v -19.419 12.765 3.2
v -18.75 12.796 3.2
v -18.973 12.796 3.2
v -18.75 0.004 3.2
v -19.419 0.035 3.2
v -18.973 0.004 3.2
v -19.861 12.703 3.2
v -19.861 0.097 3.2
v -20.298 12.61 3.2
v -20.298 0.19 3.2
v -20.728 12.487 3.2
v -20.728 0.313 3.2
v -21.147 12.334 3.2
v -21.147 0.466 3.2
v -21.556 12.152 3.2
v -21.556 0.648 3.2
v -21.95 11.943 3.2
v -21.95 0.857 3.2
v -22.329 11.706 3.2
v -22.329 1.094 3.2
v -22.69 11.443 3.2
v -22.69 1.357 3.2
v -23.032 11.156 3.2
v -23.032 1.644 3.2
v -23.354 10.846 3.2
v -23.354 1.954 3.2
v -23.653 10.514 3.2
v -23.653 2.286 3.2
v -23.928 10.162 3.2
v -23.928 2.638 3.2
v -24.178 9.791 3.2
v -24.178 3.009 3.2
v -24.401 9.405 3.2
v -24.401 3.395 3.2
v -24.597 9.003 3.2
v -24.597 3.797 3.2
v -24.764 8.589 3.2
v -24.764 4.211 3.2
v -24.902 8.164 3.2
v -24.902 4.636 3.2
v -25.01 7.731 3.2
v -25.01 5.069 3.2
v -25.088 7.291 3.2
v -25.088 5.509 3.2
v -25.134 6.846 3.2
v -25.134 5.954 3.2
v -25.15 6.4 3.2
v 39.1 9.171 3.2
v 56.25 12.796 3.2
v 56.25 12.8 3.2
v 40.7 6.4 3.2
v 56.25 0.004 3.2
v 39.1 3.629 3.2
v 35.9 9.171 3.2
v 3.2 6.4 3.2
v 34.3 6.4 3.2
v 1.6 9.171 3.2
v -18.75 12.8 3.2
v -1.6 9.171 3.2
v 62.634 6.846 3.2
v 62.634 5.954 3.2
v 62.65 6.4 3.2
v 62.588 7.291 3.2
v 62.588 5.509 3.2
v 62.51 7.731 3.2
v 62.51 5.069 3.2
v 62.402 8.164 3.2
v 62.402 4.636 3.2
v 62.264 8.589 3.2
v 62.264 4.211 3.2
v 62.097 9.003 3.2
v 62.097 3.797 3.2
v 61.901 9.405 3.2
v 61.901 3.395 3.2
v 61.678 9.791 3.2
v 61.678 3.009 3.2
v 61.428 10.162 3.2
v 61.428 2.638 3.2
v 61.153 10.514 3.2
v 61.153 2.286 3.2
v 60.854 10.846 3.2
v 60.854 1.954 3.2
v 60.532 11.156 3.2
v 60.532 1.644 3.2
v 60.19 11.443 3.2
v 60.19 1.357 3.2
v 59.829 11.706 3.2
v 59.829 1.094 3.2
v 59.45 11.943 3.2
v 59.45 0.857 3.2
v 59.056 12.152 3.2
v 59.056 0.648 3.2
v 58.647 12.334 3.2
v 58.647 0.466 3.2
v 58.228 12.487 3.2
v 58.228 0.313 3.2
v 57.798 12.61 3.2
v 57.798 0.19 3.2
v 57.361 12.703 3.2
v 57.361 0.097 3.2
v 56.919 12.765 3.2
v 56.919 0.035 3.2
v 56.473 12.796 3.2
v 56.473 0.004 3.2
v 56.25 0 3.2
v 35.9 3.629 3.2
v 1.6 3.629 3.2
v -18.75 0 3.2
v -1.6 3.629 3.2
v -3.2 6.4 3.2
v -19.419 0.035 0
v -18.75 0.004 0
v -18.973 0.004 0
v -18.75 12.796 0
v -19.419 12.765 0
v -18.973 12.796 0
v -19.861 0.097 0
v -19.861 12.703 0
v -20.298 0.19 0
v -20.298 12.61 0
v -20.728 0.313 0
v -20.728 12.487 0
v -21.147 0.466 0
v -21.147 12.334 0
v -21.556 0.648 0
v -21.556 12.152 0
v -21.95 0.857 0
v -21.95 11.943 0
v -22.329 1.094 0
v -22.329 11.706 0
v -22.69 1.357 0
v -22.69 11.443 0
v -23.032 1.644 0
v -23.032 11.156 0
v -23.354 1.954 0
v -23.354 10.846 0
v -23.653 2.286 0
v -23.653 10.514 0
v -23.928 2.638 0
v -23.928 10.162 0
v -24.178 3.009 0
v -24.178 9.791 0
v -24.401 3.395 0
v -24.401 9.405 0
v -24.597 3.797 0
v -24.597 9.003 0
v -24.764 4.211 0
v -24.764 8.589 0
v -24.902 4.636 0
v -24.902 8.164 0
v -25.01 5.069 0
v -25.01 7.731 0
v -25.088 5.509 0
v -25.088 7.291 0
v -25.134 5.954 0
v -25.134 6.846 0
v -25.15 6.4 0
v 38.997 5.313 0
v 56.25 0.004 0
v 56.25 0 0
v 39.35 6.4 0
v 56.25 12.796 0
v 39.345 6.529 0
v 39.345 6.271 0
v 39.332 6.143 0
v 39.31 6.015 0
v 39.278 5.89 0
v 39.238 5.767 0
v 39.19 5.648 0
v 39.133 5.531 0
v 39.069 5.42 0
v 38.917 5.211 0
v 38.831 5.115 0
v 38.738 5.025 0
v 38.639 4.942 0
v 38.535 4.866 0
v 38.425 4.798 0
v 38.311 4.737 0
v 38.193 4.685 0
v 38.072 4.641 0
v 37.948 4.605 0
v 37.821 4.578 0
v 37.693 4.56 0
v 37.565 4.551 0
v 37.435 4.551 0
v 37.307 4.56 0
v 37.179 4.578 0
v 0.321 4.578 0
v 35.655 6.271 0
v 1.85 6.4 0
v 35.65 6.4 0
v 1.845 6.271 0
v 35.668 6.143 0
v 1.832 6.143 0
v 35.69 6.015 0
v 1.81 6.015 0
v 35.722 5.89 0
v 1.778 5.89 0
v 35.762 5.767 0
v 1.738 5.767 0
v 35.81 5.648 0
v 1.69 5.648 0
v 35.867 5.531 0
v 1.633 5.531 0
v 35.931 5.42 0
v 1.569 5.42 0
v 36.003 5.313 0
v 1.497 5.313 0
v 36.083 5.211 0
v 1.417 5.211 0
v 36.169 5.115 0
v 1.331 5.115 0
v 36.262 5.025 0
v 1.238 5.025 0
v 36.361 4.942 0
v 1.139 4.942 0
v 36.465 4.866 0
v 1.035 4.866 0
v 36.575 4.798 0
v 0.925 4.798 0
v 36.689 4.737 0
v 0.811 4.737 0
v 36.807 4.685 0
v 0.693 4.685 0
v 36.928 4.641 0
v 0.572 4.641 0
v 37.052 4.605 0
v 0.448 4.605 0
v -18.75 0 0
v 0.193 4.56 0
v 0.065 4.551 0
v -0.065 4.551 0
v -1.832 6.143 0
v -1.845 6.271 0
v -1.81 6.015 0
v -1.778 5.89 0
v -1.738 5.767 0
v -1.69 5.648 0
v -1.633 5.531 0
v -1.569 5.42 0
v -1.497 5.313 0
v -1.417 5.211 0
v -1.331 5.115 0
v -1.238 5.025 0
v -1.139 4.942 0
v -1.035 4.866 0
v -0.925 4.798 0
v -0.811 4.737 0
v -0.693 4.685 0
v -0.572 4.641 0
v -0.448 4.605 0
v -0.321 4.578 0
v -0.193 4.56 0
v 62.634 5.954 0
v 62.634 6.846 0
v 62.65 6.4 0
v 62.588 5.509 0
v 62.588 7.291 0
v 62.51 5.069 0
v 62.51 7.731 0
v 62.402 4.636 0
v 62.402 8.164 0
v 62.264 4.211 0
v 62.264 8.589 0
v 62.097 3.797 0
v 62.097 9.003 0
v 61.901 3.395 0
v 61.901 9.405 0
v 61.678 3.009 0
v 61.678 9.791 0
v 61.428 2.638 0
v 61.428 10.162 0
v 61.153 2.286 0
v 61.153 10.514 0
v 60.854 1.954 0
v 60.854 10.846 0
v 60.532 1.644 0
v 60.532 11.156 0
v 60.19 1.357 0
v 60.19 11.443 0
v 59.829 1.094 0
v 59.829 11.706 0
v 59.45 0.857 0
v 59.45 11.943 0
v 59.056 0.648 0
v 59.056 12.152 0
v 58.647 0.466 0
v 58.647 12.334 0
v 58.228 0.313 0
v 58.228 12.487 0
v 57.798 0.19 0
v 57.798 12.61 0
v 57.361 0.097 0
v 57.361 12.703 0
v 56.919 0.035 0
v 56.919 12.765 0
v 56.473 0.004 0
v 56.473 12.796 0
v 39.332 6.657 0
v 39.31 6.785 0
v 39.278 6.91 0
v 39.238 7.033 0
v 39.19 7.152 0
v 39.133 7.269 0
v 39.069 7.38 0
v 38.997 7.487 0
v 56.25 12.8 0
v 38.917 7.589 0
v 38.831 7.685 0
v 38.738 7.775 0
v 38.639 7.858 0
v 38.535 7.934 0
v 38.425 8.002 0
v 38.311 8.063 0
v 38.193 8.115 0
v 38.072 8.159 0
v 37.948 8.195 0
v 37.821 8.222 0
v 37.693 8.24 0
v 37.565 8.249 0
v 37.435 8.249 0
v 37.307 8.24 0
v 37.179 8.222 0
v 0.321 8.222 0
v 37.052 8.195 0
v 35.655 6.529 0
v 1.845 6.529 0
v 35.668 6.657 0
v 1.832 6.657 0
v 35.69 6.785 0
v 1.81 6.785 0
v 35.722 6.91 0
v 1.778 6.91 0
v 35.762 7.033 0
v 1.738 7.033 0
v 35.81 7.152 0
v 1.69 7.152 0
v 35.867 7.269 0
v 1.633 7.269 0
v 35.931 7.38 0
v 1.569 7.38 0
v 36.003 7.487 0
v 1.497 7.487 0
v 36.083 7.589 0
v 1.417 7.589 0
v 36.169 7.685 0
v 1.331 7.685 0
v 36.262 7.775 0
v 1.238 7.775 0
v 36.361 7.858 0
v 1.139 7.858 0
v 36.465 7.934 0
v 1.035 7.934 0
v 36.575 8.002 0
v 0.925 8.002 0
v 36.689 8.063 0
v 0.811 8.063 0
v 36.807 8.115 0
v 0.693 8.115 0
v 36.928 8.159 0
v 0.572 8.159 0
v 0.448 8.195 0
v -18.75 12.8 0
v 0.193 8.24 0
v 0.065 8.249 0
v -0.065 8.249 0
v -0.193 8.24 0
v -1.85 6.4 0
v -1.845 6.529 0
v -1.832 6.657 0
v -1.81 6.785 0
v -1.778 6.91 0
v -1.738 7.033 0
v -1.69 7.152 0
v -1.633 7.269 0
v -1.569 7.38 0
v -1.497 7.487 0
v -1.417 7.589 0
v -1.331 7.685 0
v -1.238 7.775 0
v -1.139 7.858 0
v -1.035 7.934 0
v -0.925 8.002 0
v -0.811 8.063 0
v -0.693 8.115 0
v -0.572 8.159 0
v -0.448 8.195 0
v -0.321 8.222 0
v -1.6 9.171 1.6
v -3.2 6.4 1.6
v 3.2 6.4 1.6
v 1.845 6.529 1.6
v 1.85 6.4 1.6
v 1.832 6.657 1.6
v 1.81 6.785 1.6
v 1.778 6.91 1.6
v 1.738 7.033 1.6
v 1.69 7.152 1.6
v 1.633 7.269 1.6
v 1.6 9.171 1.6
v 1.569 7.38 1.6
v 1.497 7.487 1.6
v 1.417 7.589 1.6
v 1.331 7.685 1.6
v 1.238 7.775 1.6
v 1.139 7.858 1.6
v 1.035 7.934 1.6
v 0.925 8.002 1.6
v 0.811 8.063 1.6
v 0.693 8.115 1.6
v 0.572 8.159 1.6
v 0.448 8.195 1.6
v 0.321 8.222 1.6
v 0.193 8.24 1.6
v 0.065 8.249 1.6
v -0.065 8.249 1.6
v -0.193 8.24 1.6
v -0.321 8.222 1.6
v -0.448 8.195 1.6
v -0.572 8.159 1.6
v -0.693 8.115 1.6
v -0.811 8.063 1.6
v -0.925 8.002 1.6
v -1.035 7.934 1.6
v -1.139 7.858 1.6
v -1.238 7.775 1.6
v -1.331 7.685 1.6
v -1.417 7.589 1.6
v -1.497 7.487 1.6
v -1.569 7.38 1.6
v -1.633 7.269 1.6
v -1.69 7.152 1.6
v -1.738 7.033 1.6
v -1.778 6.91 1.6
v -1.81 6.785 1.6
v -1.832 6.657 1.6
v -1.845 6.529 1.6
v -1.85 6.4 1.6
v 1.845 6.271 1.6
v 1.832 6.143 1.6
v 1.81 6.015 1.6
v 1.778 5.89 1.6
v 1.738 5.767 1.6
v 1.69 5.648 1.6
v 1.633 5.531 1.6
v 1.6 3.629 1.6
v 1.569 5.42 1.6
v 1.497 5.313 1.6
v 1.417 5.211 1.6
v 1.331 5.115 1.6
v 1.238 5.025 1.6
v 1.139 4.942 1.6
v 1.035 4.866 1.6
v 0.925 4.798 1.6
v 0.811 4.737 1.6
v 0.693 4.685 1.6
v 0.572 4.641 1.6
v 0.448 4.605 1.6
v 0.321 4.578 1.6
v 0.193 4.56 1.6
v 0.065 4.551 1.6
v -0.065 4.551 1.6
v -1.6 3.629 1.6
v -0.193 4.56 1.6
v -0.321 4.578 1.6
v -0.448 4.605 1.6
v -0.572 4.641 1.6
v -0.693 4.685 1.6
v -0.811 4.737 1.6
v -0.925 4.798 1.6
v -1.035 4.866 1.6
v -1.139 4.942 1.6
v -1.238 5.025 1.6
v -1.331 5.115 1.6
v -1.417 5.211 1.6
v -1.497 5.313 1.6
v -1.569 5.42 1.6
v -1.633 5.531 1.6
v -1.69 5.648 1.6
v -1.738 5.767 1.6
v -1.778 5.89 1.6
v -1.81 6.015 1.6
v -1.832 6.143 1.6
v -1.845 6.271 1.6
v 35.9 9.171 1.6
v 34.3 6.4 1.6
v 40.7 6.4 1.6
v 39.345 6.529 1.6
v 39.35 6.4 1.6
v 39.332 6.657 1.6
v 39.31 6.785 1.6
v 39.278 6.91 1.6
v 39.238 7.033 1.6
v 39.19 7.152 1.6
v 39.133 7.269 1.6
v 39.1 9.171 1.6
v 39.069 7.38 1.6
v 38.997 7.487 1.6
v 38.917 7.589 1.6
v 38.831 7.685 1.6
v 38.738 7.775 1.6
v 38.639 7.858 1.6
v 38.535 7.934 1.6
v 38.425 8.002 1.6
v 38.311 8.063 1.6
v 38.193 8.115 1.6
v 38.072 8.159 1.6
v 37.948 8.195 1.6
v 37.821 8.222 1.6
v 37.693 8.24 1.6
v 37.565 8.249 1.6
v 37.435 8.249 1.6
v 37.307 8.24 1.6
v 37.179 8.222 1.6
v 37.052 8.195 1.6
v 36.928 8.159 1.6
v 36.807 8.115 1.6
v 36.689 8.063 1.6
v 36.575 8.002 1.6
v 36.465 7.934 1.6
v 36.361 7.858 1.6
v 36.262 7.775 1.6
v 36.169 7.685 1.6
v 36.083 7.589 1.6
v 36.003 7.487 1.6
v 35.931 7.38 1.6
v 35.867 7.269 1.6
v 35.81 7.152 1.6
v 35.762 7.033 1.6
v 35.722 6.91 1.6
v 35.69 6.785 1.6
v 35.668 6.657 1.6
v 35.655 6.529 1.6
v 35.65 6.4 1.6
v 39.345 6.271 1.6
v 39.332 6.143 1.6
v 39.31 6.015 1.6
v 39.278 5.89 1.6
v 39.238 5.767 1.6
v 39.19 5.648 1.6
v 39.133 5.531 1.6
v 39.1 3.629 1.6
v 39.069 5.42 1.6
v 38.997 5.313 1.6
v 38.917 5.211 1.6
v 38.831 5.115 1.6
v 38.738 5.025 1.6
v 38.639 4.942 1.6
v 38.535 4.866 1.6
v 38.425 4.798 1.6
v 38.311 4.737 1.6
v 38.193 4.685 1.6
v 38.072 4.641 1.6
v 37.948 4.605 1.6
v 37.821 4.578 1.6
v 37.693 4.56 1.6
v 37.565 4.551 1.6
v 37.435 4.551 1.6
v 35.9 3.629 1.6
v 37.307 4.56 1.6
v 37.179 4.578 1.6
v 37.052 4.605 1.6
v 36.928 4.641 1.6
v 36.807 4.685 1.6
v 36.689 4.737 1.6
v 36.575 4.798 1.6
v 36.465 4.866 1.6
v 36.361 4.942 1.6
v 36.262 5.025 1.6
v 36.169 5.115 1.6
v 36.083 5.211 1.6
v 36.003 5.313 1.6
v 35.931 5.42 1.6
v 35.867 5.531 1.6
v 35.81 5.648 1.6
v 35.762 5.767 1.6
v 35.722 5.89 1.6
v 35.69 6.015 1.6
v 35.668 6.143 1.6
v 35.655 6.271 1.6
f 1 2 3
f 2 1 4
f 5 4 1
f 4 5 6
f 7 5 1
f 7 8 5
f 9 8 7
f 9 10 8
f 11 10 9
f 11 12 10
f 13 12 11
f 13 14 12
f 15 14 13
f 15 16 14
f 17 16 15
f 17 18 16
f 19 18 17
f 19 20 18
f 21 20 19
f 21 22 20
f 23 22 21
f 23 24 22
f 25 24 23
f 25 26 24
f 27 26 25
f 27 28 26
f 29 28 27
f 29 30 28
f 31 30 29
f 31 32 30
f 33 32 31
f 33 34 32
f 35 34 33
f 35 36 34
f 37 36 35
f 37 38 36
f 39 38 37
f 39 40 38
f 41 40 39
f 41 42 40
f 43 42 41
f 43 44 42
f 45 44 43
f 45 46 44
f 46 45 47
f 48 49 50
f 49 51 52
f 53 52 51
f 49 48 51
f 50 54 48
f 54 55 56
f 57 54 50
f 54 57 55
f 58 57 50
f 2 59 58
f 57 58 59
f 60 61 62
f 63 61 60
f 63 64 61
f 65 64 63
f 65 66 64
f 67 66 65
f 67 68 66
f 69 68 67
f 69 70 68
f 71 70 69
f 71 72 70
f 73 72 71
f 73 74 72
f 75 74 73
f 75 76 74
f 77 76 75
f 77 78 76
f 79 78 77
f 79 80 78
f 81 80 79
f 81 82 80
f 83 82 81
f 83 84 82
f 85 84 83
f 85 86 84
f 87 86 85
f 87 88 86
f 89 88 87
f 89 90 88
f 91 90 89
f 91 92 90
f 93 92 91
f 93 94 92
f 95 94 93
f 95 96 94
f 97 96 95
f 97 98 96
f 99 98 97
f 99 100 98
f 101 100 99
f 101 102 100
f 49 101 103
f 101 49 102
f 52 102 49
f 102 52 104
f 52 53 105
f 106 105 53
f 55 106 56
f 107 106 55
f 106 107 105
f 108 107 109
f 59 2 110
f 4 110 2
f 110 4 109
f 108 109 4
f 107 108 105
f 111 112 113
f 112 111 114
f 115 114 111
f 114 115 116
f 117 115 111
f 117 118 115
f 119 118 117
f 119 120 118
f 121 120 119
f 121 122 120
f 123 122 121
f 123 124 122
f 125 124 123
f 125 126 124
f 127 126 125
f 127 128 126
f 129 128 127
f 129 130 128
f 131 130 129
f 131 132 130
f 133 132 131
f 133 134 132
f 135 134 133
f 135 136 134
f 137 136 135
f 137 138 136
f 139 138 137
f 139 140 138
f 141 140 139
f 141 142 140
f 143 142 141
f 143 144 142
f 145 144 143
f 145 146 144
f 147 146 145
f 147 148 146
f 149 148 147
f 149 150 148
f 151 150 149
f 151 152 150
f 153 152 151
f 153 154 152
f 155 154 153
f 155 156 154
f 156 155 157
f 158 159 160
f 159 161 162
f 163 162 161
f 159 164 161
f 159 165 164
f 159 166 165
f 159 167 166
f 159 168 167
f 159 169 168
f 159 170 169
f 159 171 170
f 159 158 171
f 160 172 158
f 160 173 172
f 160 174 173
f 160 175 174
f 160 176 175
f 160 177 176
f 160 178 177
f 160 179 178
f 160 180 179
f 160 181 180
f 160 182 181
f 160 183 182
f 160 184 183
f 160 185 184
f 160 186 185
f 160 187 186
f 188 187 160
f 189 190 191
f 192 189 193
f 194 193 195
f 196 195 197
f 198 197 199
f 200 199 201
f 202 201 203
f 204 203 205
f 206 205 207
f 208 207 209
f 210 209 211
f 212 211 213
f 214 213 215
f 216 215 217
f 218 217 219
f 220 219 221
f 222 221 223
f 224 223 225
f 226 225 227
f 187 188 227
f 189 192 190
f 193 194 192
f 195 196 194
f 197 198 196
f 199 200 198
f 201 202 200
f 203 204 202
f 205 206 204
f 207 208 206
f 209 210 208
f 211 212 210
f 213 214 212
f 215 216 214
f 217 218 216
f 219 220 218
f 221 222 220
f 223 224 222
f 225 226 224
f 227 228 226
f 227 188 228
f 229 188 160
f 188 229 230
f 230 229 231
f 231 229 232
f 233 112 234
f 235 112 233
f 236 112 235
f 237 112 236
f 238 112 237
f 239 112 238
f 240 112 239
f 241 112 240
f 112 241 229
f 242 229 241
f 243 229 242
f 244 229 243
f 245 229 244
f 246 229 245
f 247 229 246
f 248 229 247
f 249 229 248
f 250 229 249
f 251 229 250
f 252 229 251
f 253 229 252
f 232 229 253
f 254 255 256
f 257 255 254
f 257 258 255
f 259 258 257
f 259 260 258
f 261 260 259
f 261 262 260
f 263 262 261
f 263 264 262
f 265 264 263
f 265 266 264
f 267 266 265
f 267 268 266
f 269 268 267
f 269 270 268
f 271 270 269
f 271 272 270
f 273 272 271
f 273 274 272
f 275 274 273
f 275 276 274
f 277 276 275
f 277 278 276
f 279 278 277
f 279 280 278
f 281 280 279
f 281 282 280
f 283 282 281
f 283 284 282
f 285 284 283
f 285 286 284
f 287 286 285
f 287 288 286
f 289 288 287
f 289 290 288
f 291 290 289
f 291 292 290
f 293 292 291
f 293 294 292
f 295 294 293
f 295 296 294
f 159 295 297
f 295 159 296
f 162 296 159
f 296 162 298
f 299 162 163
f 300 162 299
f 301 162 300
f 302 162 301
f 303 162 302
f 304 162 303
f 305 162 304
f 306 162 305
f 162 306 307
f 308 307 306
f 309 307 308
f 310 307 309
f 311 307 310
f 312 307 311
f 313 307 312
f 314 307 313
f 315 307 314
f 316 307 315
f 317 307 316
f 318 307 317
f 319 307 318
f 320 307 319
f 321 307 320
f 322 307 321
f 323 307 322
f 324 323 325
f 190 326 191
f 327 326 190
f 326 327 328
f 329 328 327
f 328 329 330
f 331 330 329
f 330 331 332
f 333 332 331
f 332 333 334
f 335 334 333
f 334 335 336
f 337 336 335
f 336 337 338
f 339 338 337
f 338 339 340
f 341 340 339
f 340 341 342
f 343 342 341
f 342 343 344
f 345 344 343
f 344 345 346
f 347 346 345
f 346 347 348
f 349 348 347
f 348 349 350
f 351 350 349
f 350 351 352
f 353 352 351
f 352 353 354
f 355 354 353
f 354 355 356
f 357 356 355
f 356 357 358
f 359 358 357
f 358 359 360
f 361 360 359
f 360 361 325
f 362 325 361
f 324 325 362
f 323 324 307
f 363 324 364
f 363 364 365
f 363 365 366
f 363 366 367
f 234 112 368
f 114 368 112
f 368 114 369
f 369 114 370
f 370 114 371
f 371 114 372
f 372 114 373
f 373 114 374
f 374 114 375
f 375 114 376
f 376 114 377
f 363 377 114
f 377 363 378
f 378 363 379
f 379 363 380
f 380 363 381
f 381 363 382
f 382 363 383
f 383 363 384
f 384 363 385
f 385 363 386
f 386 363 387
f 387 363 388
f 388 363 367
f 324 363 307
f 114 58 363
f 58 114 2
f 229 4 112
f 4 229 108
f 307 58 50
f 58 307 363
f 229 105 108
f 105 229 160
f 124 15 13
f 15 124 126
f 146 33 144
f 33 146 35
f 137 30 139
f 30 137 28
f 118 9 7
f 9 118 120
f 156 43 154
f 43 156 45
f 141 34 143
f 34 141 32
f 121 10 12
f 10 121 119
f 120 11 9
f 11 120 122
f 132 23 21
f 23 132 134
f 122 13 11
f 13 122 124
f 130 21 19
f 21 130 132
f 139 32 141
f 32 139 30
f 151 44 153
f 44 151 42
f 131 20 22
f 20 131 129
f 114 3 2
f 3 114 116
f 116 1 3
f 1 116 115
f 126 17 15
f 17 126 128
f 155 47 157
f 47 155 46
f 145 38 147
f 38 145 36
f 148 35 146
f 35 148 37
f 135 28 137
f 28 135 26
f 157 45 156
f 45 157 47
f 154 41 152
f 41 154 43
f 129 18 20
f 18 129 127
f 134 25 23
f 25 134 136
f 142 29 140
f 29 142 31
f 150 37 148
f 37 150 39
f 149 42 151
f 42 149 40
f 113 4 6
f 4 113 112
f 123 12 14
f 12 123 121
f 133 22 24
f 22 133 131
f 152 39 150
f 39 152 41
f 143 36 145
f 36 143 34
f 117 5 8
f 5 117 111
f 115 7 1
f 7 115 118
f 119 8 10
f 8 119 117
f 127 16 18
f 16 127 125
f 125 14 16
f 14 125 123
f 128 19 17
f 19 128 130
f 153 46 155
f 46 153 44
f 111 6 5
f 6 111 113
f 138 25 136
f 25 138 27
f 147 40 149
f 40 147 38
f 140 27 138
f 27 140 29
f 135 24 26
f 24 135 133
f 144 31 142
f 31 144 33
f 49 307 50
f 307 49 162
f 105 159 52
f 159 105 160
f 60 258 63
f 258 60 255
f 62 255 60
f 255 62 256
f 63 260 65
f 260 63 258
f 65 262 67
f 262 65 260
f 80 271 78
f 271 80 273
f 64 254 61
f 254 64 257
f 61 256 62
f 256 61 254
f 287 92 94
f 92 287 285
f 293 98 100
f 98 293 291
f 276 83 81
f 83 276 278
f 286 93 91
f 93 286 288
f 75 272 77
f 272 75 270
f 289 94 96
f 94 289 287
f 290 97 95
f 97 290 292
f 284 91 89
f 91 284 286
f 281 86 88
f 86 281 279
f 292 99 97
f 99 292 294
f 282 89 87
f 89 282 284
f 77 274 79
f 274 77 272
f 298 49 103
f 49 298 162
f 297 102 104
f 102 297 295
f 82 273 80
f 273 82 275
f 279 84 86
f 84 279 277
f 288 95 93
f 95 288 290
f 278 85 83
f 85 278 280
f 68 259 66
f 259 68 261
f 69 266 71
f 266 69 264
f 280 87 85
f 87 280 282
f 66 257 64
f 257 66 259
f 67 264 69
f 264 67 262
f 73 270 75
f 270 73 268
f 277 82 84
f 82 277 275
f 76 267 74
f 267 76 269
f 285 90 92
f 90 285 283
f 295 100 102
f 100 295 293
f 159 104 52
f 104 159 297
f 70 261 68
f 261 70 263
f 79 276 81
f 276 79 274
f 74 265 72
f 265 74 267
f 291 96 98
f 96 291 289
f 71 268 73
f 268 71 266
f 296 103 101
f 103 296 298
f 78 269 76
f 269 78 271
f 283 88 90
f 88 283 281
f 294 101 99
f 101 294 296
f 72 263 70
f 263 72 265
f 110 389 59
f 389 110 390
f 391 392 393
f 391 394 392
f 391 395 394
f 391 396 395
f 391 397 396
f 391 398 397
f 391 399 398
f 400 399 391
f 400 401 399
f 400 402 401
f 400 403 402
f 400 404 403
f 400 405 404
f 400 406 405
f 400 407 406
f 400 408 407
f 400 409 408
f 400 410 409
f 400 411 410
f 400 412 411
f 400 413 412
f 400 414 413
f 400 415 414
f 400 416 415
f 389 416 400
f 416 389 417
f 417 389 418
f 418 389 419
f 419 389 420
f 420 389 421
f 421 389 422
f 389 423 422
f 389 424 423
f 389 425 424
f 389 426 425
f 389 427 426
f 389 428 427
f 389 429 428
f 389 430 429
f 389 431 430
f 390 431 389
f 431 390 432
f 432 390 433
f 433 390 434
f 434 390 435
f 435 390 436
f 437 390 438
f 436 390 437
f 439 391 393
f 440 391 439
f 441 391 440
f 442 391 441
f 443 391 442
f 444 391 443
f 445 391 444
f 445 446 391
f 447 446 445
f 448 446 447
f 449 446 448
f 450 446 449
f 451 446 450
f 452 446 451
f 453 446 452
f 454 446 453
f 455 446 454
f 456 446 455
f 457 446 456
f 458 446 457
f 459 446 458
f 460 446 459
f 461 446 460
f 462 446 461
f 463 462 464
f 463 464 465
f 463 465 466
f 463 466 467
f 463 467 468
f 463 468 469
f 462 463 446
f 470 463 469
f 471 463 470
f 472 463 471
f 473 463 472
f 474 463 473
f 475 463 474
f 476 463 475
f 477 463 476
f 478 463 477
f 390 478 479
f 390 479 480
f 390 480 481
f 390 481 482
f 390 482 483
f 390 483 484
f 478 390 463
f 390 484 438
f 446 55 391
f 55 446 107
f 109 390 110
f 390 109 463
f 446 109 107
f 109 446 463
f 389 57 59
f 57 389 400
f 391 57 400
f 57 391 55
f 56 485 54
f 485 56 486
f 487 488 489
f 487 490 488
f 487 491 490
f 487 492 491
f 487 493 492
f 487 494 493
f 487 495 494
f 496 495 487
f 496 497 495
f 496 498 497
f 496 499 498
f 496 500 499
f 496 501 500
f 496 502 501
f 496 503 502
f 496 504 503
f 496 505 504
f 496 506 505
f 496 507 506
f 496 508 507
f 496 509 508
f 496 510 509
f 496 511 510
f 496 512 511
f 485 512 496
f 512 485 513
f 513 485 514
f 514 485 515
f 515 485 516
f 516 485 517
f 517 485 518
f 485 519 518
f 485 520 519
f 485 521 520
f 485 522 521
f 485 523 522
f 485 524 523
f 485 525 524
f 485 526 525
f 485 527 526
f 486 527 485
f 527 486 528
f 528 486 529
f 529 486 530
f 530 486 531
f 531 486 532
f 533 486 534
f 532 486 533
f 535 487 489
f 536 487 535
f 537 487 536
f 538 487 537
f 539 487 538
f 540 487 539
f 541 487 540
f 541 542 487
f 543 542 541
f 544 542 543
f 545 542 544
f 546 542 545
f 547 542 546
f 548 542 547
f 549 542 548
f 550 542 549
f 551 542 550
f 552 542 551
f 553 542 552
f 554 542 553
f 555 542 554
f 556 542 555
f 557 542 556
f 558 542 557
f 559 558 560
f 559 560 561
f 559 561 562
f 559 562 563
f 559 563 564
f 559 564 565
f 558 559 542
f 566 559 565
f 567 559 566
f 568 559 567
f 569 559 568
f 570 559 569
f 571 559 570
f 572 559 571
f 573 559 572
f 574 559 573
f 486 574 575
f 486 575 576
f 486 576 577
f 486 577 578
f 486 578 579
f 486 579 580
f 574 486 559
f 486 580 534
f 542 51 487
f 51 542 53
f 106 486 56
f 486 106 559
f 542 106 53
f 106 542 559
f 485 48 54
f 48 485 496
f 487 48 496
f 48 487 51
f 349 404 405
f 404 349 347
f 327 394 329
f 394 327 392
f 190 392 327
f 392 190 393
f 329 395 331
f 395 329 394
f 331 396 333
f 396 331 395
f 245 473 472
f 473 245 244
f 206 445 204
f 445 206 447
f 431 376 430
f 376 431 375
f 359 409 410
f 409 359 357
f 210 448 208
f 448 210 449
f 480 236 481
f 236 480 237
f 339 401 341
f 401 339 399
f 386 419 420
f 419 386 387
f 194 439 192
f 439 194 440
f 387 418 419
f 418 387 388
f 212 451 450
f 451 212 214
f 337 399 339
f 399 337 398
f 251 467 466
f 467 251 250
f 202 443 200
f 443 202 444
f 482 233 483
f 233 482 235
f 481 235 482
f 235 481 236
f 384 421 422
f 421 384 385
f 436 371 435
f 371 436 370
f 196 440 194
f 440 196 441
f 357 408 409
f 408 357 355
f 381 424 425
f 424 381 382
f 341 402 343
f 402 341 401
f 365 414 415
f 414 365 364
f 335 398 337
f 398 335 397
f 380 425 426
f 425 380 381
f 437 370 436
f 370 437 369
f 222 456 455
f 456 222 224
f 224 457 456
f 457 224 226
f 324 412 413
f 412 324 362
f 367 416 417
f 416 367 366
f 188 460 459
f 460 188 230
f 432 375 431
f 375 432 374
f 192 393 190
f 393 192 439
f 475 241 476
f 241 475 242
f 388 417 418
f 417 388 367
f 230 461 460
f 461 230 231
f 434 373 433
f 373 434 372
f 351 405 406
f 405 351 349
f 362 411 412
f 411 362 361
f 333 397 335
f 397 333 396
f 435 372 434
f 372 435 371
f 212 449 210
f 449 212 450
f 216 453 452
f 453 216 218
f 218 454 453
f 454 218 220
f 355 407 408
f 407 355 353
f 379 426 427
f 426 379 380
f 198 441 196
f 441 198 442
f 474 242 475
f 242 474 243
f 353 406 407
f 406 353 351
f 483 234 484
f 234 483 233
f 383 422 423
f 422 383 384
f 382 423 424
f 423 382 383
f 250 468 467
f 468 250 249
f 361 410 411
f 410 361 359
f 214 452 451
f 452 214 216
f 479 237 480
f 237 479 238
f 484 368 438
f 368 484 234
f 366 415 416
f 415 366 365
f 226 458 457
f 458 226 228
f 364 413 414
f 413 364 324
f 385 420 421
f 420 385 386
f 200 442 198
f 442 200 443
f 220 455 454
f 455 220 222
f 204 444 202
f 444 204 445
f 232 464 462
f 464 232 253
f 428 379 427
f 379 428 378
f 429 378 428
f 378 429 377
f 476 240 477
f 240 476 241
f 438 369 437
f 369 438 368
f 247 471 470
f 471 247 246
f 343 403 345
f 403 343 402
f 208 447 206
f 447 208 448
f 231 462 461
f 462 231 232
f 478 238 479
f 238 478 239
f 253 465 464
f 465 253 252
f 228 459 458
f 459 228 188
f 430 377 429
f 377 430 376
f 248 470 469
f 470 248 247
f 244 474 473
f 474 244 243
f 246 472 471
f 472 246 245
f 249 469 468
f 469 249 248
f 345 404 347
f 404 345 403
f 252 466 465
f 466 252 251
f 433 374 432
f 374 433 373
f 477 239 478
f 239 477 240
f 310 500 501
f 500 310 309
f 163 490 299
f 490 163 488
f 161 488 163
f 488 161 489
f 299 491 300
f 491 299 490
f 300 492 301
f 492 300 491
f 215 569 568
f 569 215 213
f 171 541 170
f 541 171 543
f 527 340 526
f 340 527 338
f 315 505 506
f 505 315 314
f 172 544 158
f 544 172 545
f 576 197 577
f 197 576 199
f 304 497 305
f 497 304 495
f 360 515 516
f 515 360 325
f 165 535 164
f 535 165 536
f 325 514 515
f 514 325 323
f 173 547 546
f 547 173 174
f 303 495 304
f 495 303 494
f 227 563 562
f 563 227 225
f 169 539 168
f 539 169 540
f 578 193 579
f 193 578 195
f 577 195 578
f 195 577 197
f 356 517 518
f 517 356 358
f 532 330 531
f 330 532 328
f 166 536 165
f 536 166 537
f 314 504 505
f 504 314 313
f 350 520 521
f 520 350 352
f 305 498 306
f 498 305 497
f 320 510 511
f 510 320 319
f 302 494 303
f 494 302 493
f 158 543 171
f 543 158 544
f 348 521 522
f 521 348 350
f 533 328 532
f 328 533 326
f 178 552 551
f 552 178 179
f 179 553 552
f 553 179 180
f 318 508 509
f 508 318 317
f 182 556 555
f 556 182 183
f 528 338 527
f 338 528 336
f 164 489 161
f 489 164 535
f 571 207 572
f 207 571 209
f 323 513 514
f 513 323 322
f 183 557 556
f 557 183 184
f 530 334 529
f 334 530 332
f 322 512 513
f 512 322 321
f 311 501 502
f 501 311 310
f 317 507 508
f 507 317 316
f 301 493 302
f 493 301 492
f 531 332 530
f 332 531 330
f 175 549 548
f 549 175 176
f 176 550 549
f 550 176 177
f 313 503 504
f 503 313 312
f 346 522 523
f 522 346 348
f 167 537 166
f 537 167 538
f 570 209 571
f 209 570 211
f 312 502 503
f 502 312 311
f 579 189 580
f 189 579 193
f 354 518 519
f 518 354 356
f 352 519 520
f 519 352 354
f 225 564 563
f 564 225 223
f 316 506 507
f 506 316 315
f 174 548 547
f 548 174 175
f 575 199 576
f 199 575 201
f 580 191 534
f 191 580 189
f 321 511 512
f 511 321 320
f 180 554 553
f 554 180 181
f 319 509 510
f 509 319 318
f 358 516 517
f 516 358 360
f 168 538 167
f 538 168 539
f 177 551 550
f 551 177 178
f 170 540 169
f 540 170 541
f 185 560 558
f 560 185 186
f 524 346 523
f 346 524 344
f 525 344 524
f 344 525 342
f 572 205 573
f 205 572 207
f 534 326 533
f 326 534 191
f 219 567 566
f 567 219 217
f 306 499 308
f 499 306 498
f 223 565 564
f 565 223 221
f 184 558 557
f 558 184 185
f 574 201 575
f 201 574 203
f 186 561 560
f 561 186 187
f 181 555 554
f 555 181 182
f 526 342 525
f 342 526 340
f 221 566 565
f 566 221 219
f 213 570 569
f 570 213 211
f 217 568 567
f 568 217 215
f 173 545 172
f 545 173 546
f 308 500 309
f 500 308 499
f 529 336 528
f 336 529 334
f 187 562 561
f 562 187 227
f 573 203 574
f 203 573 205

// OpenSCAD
// file: ../../modules/hexagon.scad
module hexagon(r = 1) {
  polygon([
    [-1 * r, 0],
    [-.5 * r, r * sqrt(3) / 2],
    [.5 * r, r * sqrt(3) / 2],
    [1 * r, 0],
    [.5 * r, r * sqrt(3) / -2],
    [-.5 * r, r * sqrt(3) / -2],
  ]);
}
// file: ../../modules/fillet.scad
module fillet(r, l) {
  difference() {
    cube([r, r, l]);
    translate([0, 0, -.1]) cylinder(h = l + .2, r = r);
  }
}
// file: _common.scad
include <../../modules/fillet.scad>
include <../../modules/hexagon.scad>

$fa=4; // default minimum facet angle is now 0.5
$fs=0.05; // default minimum facet size is now 0.05 mm

unit = 50;

unitsWide = 1;
unitsTall = 2;

width = unitsWide * unit;
height = unitsTall * unit;
depth = 150;

wallThickness = 1.6;
sphereDetentRad = 2.4;

filletRad = 4;

tolerance = 0.5;

// M3 screw
screwRad = 1.6;
screwHeadRad = 3;
nutRad = 3.2;


module baseShape() {
  difference() {
    cube([width, depth, height]);
    translate([filletRad, 0, filletRad]) rotate([90, 90, 180]) fillet(r = filletRad, l = depth);
    translate([width - filletRad, 0, filletRad]) rotate([90, 180, 180]) fillet(r = filletRad, l = depth);
    translate([filletRad, 0, height - filletRad]) rotate([90, 0, 180]) fillet(r = filletRad, l = depth);
    translate([width - filletRad, 0, height - filletRad]) rotate([90, -90, 180]) fillet(r = filletRad, l = depth);
  }
}
// main file
include <_common.scad>

long = 1;

difference() {
  union() {
    cube([depth / 4, nutRad * 4, wallThickness * 2]);
    translate([0, nutRad * 2, 0]) cylinder(r = nutRad * 2, h = wallThickness * 2);
    translate([depth / 4, nutRad * 2, 0]) cylinder(r = nutRad * 2, h = wallThickness * 2);

    if (long == 1) {
      translate([-depth / 8, 0, 0]) cube([depth / 8, nutRad * 4, wallThickness * 2]);
      translate([-depth / 8, nutRad * 2, 0]) cylinder(r = nutRad * 2, h = wallThickness * 2);

      translate([depth / 4, 0, 0]) cube([depth / 8, nutRad * 4, wallThickness * 2]);
      translate([depth * 3 / 8, nutRad * 2, 0]) cylinder(r = nutRad * 2, h = wallThickness * 2);

    }
  }

  translate([0, nutRad * 2, wallThickness]) linear_extrude(wallThickness + .1) hexagon(r = nutRad);
  translate([depth / 4, nutRad * 2, wallThickness]) linear_extrude(wallThickness + .1) hexagon(r = nutRad);

  translate([0, nutRad * 2, -.5]) cylinder(r = screwRad + tolerance / 2, h = wallThickness + 1);
  translate([depth / 4, nutRad * 2, -.5]) cylinder(r = screwRad + tolerance / 2, h = wallThickness + 1);
}
